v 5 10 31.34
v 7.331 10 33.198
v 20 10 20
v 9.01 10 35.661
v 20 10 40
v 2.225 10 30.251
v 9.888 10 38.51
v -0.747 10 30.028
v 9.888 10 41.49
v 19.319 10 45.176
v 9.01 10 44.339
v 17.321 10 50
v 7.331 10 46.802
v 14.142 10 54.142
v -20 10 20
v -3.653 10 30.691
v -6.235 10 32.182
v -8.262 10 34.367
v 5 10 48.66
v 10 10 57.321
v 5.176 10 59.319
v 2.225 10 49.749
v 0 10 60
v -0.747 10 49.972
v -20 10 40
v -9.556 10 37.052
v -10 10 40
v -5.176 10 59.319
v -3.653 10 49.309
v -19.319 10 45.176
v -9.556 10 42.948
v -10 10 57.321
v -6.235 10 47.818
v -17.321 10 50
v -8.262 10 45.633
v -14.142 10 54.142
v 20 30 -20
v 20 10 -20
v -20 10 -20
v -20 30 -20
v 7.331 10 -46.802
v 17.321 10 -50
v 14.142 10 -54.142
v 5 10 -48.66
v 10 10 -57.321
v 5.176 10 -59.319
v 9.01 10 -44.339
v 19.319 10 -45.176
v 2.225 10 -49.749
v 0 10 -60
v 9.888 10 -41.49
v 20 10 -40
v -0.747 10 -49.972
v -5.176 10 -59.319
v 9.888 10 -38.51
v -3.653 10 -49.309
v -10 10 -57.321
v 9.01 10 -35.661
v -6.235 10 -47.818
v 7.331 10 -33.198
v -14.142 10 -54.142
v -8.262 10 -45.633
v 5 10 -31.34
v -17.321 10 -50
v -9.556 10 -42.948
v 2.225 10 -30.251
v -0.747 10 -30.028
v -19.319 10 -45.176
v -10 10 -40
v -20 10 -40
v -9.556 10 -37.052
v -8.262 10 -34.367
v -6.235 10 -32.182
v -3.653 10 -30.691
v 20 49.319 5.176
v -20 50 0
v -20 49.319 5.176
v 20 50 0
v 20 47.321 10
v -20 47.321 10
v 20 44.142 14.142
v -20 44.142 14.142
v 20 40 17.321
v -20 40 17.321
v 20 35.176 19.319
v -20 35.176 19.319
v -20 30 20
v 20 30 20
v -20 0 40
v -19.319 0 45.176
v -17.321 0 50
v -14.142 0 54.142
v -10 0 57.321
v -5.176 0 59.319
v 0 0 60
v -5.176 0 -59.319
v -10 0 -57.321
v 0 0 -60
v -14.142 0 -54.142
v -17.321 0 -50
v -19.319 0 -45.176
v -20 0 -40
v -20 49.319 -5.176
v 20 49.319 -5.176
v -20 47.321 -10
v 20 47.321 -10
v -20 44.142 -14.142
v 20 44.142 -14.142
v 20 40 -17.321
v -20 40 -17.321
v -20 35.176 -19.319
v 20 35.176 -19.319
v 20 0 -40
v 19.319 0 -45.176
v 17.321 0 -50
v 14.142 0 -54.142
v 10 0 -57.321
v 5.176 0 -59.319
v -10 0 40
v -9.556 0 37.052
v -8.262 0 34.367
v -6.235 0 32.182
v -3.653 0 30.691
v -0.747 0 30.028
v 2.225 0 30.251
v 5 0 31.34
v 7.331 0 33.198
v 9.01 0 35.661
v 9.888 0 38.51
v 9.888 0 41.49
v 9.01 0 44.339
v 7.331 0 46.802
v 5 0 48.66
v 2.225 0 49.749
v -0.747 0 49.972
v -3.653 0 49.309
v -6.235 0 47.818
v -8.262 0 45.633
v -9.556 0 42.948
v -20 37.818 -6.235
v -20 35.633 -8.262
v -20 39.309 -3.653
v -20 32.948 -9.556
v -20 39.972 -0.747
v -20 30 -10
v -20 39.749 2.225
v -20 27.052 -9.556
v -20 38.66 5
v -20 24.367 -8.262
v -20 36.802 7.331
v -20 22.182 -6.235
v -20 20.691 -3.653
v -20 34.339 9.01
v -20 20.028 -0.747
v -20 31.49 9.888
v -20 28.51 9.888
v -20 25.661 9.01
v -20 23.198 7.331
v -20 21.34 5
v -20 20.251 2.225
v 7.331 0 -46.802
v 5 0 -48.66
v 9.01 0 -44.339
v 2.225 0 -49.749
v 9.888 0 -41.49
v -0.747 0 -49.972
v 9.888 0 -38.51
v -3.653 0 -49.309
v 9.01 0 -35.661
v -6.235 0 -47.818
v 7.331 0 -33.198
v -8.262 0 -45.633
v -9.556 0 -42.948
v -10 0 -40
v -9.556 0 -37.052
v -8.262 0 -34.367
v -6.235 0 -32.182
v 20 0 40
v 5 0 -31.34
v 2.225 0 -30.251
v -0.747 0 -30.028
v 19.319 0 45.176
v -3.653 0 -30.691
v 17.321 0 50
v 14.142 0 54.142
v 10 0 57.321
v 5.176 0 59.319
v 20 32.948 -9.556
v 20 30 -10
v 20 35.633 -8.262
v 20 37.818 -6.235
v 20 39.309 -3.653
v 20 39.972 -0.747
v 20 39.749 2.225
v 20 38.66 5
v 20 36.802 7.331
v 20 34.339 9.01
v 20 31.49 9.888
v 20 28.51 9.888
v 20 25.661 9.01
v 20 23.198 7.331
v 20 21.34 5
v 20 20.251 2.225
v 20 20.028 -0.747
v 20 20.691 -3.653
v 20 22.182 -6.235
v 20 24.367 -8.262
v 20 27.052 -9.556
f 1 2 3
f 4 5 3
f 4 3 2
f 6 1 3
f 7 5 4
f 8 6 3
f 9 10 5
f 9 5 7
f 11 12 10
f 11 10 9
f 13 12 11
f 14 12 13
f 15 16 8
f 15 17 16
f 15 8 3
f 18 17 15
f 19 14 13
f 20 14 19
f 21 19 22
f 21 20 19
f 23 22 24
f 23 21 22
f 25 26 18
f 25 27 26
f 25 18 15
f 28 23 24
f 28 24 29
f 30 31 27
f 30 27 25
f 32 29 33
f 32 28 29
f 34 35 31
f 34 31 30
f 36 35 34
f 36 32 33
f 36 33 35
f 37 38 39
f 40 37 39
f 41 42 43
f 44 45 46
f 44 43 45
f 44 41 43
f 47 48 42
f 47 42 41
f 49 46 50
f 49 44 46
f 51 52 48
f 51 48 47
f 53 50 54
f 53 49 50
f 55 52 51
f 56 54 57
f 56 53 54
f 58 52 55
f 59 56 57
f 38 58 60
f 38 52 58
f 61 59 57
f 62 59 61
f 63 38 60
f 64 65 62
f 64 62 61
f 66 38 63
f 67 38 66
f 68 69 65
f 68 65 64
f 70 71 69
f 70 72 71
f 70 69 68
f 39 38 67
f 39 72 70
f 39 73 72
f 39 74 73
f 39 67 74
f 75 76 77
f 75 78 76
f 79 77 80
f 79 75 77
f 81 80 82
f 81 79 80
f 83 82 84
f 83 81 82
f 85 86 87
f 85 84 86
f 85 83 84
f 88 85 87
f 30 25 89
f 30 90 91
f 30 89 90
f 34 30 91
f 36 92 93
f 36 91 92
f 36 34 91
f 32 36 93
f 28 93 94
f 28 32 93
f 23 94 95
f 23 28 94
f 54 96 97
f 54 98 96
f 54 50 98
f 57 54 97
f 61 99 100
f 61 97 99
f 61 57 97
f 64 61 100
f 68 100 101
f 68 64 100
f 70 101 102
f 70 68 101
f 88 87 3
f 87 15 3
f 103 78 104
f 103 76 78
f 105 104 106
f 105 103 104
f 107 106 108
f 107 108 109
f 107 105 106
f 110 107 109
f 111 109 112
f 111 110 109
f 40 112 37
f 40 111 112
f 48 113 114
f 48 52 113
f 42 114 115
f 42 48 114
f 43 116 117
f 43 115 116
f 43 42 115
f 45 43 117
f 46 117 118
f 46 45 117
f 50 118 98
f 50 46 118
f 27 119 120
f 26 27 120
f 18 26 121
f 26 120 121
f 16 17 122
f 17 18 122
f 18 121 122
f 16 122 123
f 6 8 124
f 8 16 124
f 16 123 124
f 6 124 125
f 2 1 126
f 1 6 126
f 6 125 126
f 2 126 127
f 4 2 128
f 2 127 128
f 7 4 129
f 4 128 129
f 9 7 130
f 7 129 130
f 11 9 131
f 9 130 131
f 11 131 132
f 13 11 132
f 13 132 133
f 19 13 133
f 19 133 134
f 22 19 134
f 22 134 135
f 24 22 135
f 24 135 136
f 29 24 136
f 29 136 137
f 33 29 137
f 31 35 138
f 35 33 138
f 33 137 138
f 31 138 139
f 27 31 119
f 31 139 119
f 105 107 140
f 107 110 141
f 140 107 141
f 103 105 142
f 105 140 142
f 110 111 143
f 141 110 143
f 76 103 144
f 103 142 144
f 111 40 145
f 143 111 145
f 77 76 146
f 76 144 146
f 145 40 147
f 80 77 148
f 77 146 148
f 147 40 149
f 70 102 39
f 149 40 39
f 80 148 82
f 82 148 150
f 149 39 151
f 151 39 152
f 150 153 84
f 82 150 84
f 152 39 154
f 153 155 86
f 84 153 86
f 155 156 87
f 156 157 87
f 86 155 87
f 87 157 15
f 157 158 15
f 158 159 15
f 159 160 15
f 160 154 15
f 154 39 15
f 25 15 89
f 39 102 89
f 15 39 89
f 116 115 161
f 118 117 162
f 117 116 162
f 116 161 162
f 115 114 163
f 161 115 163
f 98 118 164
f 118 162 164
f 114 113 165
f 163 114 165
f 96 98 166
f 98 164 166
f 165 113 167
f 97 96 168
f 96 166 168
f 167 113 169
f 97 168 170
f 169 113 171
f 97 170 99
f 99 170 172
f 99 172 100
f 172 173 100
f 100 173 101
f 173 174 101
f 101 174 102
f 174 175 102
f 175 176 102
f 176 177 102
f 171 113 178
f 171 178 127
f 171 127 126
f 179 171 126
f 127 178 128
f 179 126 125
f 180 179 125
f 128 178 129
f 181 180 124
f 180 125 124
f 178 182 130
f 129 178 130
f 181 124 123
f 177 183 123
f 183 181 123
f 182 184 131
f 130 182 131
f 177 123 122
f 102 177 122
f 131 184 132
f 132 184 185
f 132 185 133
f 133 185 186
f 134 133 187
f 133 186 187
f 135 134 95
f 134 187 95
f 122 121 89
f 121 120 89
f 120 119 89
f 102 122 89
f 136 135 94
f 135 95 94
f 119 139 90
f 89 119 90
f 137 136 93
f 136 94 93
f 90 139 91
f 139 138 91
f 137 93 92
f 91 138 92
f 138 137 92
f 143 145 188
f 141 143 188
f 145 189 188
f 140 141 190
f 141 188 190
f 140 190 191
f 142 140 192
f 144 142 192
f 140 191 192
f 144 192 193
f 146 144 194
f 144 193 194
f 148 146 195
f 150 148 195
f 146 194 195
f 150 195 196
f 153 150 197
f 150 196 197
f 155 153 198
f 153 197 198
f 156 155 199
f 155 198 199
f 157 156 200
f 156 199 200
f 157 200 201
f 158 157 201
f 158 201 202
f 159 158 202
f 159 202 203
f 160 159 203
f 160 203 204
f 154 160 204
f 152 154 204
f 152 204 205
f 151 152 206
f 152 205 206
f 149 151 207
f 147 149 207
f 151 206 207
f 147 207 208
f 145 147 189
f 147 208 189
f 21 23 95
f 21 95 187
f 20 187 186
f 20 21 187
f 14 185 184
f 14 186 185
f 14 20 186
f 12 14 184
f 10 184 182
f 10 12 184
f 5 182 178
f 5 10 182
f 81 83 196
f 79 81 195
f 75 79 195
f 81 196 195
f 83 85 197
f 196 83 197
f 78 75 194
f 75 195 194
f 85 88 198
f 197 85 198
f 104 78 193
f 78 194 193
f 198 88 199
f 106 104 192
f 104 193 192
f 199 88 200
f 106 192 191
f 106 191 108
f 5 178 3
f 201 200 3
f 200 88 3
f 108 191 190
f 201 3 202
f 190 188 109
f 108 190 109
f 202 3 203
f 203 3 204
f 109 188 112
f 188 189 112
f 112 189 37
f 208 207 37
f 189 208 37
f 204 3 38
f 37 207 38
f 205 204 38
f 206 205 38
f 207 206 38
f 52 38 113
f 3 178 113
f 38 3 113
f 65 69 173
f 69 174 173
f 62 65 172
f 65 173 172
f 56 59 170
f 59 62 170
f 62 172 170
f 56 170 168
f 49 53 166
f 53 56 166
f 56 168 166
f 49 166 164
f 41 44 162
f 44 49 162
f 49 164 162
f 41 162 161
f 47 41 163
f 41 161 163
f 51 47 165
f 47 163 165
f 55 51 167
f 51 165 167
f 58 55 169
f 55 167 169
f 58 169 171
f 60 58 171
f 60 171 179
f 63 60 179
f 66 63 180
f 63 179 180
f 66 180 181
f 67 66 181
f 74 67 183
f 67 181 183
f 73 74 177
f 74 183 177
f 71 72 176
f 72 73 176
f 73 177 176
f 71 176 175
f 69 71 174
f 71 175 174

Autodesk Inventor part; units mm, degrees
ref_plane "YZ Plane" through (0, 0, 0) normal (1, 0, 0) x (0, 1, 0)
ref_plane "XZ Plane" through (0, 0, 0) normal (0, 1, 0) x (-1, 0, 0)
ref_plane "XY Plane" through (0, 0, 0) normal (0, 0, 1) x (1, 0, 0)
sketch "Boceto1" plane through (0, 0, 0) normal (0, 1, 0) x (-1, 0, 0)
  line L0 (-20, -60) -> (20, -60)
  line L1 (20, -60) -> (20, 60)
  line L2 (20, 60) -> (-20, 60)
  line L3 (-20, 60) -> (-20, -60)
  line L4 (-20, -60) -> (20, 60) construction
  line L5 (20, -60) -> (-20, 60) construction
  line L6 (20, 60) -> (-20, 60)
  line L7 (-20, 60) -> (-20, 20)
  line L8 (-20, 20) -> (20, 20)
  line L9 (20, 20) -> (20, 60)
  line L10 (20, -60) -> (-20, -60)
  line L11 (-20, -60) -> (-20, -20)
  line L12 (-20, -20) -> (20, -20)
  line L13 (20, -20) -> (20, -60)
  circle A0 centre (0, 40) radius 10
  circle A1 centre (0, -40) radius 10
  line L14 (20, 20) -> (-20, 20)
  line L15 (-20, 20) -> (-20, -20)
  line L16 (-20, -20) -> (20, -20)
  line L17 (20, -20) -> (20, 20)
  point P0 (0, 0)
  dimension "d0" = 40
  dimension "d1" = 120
  dimension "d2" = 40
  dimension "d3" = 40
  dimension "d4" = 40
  dimension "d5" = 20
  dimension "d7" = 20
extrude "Extrusión1" add sketch "Boceto1" along normal blind 10
sketch "Boceto2" plane through (0, 10, 0) normal (0, 1, 0) x (1, 0, 0)
  line L0 (-20, -20) -> (20, -20)
  line L1 (20, -20) -> (20, 20)
  line L2 (20, 20) -> (-20, 20)
  line L3 (-20, 20) -> (-20, -20)
  line L4 (-20, -20) -> (20, 20) construction
  line L5 (20, -20) -> (-20, 20) construction
  point P0 (0, 0)
  dimension "d10" = 40
  dimension "d11" = 40
extrude "Extrusión2" add sketch "Boceto2" along normal blind 40
fillet "Empalme de cara1" radius 20 1 edges at (20, 5, 60)
fillet "Empalme de cara2" radius 20 1 edges at (-20, 5, 60)
fillet "Empalme de cara3" radius 20 1 edges at (-20, 5, -60)
fillet "Empalme de cara4" radius 20 1 edges at (20, 5, -60)
sketch "Boceto3" plane through (20, 10, -20) normal (1, 0, 0) x (0, 0, -1)
  line L0 (-60, 0) -> (-40, 0) projected
  circle A0 centre (-20, 20) radius 10
  point P0 (-20, -10)
  dimension "d22" = 20
extrude "Extrusión3" cut sketch "Boceto3" against normal blind 40
fillet "Empalme de cara5" radius 20 1 edges at (0, 50, 20)
fillet "Empalme de cara6" radius 20 1 edges at (0, 50, -20)
properties part number "Tarea 1"
